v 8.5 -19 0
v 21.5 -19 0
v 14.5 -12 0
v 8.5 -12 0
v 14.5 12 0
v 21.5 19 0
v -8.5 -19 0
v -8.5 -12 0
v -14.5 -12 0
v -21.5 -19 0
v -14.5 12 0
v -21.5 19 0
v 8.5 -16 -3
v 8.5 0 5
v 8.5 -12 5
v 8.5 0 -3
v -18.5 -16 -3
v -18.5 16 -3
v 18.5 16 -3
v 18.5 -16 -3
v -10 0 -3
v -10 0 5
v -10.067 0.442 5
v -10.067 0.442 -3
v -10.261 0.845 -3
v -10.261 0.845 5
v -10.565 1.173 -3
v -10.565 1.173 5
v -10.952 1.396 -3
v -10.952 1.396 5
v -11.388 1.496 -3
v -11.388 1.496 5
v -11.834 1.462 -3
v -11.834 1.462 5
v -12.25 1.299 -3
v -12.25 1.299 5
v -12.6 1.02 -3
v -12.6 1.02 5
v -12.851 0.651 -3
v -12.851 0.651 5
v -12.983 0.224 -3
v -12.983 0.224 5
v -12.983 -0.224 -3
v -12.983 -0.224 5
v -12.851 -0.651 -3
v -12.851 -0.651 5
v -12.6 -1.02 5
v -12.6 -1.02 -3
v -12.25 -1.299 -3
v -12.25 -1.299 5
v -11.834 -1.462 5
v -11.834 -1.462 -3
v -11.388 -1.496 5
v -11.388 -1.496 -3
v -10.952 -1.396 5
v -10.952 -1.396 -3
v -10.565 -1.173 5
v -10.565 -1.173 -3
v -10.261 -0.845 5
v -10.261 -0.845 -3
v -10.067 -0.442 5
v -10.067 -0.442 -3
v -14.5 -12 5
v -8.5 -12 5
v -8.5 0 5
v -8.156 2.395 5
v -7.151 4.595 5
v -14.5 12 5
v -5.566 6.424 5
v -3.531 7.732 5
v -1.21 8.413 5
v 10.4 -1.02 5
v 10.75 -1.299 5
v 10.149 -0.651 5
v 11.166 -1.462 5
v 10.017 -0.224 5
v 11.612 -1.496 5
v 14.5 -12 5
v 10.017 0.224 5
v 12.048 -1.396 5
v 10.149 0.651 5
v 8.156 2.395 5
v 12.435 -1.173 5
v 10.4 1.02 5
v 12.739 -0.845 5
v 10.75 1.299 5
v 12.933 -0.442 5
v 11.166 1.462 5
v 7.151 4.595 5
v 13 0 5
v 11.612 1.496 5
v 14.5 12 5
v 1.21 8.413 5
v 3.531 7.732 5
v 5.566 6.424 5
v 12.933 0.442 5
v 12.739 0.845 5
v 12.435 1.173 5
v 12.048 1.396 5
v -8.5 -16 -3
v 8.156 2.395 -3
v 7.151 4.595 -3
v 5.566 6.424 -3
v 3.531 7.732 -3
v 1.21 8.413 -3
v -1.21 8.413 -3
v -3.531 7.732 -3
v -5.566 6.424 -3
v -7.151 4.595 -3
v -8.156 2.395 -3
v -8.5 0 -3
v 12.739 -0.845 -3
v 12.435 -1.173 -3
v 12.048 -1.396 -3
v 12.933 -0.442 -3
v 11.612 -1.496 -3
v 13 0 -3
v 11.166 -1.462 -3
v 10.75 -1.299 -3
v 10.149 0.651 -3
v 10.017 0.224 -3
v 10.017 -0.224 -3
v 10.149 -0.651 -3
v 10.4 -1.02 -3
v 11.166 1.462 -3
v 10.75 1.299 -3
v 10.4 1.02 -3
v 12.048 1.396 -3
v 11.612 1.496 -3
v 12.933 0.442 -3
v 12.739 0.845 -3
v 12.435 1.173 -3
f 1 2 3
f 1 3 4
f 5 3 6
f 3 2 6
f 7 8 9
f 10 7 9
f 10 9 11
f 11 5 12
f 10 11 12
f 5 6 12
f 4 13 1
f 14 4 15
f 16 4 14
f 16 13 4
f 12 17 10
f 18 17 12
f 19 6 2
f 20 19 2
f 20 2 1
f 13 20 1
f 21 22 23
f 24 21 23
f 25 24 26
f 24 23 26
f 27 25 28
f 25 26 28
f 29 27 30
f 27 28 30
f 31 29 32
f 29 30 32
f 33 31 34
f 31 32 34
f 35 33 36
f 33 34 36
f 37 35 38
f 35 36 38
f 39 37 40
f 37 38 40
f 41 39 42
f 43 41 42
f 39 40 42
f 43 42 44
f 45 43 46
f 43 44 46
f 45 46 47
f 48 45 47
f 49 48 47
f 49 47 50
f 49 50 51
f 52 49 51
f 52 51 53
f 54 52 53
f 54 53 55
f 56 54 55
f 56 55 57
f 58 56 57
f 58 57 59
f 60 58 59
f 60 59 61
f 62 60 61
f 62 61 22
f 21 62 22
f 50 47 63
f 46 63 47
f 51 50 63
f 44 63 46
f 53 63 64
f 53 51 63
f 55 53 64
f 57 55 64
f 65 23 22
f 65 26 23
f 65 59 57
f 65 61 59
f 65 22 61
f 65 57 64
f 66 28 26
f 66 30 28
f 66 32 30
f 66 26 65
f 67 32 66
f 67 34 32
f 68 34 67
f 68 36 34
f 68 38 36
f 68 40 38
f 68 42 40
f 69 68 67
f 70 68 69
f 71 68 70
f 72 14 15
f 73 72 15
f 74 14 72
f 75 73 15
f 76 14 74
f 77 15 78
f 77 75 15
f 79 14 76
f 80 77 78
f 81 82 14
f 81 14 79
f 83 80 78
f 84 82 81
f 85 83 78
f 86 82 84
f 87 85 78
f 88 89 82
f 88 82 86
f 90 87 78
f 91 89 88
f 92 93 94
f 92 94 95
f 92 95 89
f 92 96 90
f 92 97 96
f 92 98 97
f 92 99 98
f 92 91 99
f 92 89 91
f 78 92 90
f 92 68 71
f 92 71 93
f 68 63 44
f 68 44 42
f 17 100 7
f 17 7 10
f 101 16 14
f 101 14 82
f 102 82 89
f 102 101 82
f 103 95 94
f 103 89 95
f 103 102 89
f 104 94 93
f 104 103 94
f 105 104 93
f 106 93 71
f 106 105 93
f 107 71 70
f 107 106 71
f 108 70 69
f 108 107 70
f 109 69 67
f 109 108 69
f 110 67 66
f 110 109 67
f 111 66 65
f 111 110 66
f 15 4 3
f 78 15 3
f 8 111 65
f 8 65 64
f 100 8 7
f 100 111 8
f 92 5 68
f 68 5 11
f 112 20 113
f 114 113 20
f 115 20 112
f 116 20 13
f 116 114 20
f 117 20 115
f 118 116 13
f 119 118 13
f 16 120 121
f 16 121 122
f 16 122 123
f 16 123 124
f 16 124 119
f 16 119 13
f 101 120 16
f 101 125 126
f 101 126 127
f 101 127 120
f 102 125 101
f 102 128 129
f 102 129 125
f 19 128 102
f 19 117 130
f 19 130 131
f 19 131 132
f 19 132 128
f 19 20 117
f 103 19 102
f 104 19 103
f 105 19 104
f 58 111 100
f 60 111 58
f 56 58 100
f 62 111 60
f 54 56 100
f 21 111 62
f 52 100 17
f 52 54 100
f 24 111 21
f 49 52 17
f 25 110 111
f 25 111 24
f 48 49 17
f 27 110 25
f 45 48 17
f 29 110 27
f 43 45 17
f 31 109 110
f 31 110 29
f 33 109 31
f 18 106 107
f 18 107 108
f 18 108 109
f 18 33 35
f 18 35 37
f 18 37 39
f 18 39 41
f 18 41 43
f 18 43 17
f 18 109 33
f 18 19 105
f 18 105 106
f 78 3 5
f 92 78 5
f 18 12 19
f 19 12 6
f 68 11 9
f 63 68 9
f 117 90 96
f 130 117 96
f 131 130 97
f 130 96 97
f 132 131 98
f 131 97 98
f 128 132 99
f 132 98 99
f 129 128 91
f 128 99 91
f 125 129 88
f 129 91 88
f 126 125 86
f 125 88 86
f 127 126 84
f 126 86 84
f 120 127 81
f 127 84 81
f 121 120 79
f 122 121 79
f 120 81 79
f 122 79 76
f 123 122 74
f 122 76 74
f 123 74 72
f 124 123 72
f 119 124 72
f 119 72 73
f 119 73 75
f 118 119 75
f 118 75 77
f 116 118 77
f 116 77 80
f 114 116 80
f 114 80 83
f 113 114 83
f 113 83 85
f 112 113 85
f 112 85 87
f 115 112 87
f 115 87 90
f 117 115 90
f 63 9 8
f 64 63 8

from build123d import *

# Parameters (mm, degrees)
EXTRUDE_1_DEPTH     = 5
EXTRUDE_START       = 3
EXTRUDE_2_DEPTH     = 3
SKETCH_3_R          = 1.5
CUT_EXTRUDE_1_DEPTH = 30.786742017
CHAMFER_1_SIZE      = 3


with BuildPart() as part:
    # ｽｹｯﾁ1 → ﾎﾞｽ - 押し出し1 (new body)
    with BuildSketch(Plane.XY):
        with BuildLine():
            ThreePointArc((-8.5, 0), (0, 8.5), (8.5, 0))
            Line((8.5, 0), (8.5, -12))
            Line((8.5, -12), (14.5, -12))
            Line((14.5, -12), (14.5, 12))
            Line((14.5, 12), (-14.5, 12))
            Line((-14.5, 12), (-14.5, -12))
            Line((-14.5, -12), (-8.5, -12))
            Line((-8.5, -12), (-8.5, 0))
        make_face()
    extrude(amount=EXTRUDE_1_DEPTH)

    # ｽｹｯﾁ2 → ﾎﾞｽ - 押し出し2 (add)
    with BuildSketch(Plane(origin=(0, 0, 0), x_dir=(-1, 0, 0), z_dir=(0, 0, -1)).offset(EXTRUDE_START)):
        with BuildLine():
            Line((8.5, -12), (8.5, -19))
            Line((8.5, -19), (21.5, -19))
            Line((21.5, -19), (21.5, 19))
            Line((21.5, 19), (-21.5, 19))
            Line((-21.5, 19), (-21.5, -19))
            Line((-21.5, -19), (-8.5, -19))
            Line((-8.5, -19), (-8.5, -12))
            Line((-8.5, -12), (-8.5, 0))
            ThreePointArc((-8.5, 0), (0, 8.5), (8.5, 0))
            Line((8.5, 0), (8.5, -12))
        make_face()
    extrude(amount=-EXTRUDE_2_DEPTH)

    # ｽｹｯﾁ3 → ｶｯﾄ - 押し出し1 (cut, through all)
    with BuildSketch(Plane.XY.offset(5)):
        with Locations((11.5, 0)):
            Circle(SKETCH_3_R)
        with Locations((-11.5, 0)):
            Circle(SKETCH_3_R)
    extrude(amount=-CUT_EXTRUDE_1_DEPTH, mode=Mode.SUBTRACT)

    # 面取り1
    chamfer_1_edges = [part.edges().sort_by_distance(p)[0] for p in [
        (15, -19, -3),
        (21.5, 0, -3),
        (0, 19, -3),
        (-21.5, 0, -3),
        (-15, -19, -3),
    ]]
    chamfer(chamfer_1_edges, length=CHAMFER_1_SIZE - 0.0001)  # a hair under: the kernel refuses the full size


solid = part.part
